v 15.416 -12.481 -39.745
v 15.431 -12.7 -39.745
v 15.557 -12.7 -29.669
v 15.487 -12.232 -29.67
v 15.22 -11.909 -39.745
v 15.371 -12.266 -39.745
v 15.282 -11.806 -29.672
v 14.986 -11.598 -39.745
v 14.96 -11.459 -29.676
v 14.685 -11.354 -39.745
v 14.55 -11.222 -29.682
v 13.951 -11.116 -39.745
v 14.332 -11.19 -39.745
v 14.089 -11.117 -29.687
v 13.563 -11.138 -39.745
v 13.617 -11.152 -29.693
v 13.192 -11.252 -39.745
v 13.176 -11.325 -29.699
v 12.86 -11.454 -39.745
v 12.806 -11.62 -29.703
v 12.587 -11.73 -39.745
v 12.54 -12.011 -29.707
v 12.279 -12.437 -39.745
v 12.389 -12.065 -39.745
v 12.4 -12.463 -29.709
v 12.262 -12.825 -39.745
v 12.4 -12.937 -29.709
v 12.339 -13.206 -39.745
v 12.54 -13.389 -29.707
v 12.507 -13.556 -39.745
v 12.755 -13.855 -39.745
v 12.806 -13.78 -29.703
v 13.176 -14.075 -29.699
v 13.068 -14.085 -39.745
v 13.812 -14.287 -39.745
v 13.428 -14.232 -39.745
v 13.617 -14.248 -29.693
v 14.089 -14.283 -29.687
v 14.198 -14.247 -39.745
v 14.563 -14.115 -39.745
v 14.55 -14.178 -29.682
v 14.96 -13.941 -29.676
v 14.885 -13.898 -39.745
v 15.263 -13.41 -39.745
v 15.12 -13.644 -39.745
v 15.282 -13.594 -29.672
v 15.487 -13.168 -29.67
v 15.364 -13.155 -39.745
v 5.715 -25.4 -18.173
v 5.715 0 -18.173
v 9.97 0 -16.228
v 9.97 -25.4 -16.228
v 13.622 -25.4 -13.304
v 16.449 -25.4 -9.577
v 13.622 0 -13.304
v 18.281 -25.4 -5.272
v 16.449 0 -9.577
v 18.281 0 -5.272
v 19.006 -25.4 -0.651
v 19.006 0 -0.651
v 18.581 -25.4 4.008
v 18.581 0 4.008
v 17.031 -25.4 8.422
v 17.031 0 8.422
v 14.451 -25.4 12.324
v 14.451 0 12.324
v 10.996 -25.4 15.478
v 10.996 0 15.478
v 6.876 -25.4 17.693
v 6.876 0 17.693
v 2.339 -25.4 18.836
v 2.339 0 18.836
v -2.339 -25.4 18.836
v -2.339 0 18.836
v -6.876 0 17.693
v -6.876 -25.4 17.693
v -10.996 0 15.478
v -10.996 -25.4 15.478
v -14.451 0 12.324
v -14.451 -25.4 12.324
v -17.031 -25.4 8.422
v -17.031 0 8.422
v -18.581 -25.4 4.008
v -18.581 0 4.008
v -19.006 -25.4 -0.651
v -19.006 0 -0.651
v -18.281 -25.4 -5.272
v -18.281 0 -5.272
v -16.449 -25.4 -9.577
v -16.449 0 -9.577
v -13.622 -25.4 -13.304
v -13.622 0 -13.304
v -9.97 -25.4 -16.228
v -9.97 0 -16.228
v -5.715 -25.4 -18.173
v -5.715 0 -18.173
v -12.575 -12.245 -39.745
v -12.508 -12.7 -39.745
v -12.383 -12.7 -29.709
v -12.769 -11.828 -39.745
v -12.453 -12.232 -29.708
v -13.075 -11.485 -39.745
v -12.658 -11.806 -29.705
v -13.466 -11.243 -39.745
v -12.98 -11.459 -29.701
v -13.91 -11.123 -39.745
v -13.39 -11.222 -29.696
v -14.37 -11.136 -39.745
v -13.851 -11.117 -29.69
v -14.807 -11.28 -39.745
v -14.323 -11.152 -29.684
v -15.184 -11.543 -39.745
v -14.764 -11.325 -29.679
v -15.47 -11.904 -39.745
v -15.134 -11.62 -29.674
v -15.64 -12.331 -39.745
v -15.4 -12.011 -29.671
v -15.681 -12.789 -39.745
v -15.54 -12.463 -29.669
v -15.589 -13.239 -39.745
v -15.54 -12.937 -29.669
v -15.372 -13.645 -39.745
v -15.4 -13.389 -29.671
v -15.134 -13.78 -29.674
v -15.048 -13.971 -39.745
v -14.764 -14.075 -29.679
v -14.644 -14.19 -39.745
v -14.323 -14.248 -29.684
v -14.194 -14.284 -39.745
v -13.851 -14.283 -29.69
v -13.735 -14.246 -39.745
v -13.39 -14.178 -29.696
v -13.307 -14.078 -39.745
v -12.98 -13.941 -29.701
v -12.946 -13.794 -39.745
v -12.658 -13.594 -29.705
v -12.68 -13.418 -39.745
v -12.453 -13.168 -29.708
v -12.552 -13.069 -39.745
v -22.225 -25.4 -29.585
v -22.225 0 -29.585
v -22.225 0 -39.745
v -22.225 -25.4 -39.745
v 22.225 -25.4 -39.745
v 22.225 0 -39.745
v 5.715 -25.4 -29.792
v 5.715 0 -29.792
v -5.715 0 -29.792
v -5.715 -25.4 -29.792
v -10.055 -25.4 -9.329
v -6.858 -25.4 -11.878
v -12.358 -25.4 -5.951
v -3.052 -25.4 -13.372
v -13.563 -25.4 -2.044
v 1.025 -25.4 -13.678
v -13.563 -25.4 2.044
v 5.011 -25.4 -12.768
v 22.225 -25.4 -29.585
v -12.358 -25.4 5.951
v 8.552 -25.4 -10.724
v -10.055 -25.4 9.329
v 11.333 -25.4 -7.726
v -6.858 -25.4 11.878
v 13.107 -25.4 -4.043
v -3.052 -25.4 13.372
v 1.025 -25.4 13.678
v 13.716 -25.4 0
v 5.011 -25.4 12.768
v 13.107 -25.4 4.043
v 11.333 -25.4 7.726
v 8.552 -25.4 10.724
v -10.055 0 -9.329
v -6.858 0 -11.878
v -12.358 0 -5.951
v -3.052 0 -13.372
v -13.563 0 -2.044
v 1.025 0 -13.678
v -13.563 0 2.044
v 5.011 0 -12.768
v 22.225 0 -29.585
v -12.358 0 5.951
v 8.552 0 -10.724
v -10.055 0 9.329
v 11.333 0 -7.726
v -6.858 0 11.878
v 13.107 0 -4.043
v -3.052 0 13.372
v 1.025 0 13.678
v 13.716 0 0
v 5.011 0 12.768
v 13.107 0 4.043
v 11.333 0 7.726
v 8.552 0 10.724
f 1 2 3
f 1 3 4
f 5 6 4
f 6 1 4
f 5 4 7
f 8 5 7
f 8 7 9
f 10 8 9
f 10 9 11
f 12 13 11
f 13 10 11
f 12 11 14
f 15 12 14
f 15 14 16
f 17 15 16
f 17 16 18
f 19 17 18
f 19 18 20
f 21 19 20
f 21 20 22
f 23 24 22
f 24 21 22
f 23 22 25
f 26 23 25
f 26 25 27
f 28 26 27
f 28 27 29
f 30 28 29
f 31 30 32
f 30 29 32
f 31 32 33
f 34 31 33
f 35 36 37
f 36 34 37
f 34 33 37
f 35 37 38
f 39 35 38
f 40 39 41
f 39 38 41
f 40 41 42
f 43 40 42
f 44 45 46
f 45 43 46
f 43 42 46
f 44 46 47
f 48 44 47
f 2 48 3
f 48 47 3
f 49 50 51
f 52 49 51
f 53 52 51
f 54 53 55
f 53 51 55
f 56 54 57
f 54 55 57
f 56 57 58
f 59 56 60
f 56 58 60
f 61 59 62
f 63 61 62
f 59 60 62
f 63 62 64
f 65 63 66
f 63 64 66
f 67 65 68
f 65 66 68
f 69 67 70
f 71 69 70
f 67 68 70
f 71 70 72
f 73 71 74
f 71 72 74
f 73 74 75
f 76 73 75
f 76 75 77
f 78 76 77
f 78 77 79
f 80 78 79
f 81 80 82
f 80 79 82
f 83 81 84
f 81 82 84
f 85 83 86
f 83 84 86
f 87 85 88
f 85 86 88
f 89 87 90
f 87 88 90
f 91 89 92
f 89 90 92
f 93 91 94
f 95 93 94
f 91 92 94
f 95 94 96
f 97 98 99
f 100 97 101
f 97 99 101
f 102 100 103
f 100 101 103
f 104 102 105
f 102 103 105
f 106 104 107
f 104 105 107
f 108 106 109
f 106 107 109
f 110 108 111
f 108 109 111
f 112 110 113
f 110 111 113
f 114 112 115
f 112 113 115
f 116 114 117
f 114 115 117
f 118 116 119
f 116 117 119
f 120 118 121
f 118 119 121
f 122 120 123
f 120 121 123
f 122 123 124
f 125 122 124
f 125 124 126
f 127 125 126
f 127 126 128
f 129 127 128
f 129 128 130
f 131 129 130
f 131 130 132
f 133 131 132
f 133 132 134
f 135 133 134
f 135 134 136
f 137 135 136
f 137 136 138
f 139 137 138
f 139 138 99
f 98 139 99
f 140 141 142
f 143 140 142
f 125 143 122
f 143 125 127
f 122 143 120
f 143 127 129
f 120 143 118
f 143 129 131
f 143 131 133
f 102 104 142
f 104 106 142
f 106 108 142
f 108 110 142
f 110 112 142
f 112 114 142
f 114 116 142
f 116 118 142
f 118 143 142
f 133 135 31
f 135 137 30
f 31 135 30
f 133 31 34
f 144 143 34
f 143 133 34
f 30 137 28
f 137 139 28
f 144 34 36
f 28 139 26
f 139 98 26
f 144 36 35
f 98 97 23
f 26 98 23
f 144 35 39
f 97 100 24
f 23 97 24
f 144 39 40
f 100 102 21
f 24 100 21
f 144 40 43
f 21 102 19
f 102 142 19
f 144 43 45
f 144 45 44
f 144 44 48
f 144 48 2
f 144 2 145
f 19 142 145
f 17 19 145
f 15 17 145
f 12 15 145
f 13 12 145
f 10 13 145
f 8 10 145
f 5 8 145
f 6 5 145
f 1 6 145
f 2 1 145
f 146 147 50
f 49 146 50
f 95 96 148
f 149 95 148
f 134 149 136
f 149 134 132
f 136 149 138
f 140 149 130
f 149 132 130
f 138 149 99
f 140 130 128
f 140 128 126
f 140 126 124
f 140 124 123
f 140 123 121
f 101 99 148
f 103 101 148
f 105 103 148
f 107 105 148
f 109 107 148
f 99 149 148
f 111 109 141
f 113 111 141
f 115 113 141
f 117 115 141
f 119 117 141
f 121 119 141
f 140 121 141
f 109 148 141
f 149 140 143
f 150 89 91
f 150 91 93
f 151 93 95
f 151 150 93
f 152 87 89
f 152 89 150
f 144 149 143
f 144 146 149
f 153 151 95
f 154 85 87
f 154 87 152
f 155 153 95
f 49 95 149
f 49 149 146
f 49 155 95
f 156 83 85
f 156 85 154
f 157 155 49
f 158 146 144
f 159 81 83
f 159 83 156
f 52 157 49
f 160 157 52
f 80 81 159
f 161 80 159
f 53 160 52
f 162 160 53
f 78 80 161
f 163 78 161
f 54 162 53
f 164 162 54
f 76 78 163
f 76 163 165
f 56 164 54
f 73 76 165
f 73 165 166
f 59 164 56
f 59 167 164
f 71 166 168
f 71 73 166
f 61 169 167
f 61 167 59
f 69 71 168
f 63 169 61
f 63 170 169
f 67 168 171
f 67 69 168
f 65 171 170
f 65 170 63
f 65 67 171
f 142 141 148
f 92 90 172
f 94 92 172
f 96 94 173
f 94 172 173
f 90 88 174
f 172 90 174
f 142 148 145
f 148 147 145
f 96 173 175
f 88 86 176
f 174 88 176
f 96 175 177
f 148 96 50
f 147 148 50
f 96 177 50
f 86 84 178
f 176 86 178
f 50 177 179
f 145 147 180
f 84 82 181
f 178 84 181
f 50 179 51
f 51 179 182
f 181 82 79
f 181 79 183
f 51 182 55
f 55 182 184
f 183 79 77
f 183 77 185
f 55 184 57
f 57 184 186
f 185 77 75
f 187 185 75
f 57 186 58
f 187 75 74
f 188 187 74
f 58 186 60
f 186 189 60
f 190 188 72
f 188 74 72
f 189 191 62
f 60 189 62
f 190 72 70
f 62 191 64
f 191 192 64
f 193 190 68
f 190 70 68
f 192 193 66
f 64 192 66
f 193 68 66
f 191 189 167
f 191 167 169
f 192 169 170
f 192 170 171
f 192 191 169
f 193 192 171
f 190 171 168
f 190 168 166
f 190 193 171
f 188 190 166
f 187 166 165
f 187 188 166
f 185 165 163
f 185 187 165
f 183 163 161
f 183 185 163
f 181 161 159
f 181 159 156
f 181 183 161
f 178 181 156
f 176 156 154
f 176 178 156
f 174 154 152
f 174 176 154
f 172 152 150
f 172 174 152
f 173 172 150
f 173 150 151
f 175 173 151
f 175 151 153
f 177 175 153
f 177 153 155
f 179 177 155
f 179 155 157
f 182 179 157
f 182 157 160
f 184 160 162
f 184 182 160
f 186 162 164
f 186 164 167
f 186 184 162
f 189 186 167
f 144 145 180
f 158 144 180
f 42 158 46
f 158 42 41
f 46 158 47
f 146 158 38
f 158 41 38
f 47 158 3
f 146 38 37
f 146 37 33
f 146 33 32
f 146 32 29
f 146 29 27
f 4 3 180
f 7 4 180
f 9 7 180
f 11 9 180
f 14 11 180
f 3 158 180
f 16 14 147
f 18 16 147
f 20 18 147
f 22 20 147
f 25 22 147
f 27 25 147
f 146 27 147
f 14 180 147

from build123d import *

# Parameters (mm, degrees)
F0_R     = 13.716
F1_DEPTH = 25.4
F3_R     = 1.5875
F2_R     = 1.5875
F4_DEPTH = 25.4


with BuildPart() as f1:
    # F0 (on Front) → F1 (new body)
    with BuildSketch(Plane.XZ):
        with BuildLine():
            Line((5.715, -29.7924076074), (5.715, -18.172541787))
            ThreePointArc((5.715, -18.172541787), (0, 18.9799369156), (-5.715, -18.172541787))
            Line((-5.715, -18.172541787), (-5.715, -29.7924076074))
            Line((-5.715, -29.7924076074), (-22.225, -29.5853535962))
            Line((-22.225, -29.5853535962), (-22.225, -39.7453535962))
            Line((-22.225, -39.7453535962), (22.225, -39.7453535962))
            Line((22.225, -39.7453535962), (22.225, -29.5853535962))
            Line((22.225, -29.5853535962), (5.715, -29.7924076074))
        make_face()
        Circle(F0_R, mode=Mode.SUBTRACT)
    extrude(amount=F1_DEPTH)

    # F3 (on face) + F2 (on face) → F4 (cut)
    with BuildSketch(Plane(origin=(-0.3744703333, 0, -29.8593838697), x_dir=(0.9999213693, 0, -0.0125401412), z_dir=(0.0125401412, 0, 0.9999213693))):
        with Locations((-13.5965987763, -12.7)):
            Circle(F3_R)
    with BuildSketch(Plane(origin=(0.3744703333, 0, -29.8593838697), x_dir=(0.9999213693, 0, 0.0125401412), z_dir=(-0.0125401412, 0, 0.9999213693))):
        with Locations((13.5965987763, -12.7)):
            Circle(F2_R)
    extrude(amount=-F4_DEPTH, dir=(0.0125401412, 0, 0.9999213693), mode=Mode.SUBTRACT)


solid = f1.part
